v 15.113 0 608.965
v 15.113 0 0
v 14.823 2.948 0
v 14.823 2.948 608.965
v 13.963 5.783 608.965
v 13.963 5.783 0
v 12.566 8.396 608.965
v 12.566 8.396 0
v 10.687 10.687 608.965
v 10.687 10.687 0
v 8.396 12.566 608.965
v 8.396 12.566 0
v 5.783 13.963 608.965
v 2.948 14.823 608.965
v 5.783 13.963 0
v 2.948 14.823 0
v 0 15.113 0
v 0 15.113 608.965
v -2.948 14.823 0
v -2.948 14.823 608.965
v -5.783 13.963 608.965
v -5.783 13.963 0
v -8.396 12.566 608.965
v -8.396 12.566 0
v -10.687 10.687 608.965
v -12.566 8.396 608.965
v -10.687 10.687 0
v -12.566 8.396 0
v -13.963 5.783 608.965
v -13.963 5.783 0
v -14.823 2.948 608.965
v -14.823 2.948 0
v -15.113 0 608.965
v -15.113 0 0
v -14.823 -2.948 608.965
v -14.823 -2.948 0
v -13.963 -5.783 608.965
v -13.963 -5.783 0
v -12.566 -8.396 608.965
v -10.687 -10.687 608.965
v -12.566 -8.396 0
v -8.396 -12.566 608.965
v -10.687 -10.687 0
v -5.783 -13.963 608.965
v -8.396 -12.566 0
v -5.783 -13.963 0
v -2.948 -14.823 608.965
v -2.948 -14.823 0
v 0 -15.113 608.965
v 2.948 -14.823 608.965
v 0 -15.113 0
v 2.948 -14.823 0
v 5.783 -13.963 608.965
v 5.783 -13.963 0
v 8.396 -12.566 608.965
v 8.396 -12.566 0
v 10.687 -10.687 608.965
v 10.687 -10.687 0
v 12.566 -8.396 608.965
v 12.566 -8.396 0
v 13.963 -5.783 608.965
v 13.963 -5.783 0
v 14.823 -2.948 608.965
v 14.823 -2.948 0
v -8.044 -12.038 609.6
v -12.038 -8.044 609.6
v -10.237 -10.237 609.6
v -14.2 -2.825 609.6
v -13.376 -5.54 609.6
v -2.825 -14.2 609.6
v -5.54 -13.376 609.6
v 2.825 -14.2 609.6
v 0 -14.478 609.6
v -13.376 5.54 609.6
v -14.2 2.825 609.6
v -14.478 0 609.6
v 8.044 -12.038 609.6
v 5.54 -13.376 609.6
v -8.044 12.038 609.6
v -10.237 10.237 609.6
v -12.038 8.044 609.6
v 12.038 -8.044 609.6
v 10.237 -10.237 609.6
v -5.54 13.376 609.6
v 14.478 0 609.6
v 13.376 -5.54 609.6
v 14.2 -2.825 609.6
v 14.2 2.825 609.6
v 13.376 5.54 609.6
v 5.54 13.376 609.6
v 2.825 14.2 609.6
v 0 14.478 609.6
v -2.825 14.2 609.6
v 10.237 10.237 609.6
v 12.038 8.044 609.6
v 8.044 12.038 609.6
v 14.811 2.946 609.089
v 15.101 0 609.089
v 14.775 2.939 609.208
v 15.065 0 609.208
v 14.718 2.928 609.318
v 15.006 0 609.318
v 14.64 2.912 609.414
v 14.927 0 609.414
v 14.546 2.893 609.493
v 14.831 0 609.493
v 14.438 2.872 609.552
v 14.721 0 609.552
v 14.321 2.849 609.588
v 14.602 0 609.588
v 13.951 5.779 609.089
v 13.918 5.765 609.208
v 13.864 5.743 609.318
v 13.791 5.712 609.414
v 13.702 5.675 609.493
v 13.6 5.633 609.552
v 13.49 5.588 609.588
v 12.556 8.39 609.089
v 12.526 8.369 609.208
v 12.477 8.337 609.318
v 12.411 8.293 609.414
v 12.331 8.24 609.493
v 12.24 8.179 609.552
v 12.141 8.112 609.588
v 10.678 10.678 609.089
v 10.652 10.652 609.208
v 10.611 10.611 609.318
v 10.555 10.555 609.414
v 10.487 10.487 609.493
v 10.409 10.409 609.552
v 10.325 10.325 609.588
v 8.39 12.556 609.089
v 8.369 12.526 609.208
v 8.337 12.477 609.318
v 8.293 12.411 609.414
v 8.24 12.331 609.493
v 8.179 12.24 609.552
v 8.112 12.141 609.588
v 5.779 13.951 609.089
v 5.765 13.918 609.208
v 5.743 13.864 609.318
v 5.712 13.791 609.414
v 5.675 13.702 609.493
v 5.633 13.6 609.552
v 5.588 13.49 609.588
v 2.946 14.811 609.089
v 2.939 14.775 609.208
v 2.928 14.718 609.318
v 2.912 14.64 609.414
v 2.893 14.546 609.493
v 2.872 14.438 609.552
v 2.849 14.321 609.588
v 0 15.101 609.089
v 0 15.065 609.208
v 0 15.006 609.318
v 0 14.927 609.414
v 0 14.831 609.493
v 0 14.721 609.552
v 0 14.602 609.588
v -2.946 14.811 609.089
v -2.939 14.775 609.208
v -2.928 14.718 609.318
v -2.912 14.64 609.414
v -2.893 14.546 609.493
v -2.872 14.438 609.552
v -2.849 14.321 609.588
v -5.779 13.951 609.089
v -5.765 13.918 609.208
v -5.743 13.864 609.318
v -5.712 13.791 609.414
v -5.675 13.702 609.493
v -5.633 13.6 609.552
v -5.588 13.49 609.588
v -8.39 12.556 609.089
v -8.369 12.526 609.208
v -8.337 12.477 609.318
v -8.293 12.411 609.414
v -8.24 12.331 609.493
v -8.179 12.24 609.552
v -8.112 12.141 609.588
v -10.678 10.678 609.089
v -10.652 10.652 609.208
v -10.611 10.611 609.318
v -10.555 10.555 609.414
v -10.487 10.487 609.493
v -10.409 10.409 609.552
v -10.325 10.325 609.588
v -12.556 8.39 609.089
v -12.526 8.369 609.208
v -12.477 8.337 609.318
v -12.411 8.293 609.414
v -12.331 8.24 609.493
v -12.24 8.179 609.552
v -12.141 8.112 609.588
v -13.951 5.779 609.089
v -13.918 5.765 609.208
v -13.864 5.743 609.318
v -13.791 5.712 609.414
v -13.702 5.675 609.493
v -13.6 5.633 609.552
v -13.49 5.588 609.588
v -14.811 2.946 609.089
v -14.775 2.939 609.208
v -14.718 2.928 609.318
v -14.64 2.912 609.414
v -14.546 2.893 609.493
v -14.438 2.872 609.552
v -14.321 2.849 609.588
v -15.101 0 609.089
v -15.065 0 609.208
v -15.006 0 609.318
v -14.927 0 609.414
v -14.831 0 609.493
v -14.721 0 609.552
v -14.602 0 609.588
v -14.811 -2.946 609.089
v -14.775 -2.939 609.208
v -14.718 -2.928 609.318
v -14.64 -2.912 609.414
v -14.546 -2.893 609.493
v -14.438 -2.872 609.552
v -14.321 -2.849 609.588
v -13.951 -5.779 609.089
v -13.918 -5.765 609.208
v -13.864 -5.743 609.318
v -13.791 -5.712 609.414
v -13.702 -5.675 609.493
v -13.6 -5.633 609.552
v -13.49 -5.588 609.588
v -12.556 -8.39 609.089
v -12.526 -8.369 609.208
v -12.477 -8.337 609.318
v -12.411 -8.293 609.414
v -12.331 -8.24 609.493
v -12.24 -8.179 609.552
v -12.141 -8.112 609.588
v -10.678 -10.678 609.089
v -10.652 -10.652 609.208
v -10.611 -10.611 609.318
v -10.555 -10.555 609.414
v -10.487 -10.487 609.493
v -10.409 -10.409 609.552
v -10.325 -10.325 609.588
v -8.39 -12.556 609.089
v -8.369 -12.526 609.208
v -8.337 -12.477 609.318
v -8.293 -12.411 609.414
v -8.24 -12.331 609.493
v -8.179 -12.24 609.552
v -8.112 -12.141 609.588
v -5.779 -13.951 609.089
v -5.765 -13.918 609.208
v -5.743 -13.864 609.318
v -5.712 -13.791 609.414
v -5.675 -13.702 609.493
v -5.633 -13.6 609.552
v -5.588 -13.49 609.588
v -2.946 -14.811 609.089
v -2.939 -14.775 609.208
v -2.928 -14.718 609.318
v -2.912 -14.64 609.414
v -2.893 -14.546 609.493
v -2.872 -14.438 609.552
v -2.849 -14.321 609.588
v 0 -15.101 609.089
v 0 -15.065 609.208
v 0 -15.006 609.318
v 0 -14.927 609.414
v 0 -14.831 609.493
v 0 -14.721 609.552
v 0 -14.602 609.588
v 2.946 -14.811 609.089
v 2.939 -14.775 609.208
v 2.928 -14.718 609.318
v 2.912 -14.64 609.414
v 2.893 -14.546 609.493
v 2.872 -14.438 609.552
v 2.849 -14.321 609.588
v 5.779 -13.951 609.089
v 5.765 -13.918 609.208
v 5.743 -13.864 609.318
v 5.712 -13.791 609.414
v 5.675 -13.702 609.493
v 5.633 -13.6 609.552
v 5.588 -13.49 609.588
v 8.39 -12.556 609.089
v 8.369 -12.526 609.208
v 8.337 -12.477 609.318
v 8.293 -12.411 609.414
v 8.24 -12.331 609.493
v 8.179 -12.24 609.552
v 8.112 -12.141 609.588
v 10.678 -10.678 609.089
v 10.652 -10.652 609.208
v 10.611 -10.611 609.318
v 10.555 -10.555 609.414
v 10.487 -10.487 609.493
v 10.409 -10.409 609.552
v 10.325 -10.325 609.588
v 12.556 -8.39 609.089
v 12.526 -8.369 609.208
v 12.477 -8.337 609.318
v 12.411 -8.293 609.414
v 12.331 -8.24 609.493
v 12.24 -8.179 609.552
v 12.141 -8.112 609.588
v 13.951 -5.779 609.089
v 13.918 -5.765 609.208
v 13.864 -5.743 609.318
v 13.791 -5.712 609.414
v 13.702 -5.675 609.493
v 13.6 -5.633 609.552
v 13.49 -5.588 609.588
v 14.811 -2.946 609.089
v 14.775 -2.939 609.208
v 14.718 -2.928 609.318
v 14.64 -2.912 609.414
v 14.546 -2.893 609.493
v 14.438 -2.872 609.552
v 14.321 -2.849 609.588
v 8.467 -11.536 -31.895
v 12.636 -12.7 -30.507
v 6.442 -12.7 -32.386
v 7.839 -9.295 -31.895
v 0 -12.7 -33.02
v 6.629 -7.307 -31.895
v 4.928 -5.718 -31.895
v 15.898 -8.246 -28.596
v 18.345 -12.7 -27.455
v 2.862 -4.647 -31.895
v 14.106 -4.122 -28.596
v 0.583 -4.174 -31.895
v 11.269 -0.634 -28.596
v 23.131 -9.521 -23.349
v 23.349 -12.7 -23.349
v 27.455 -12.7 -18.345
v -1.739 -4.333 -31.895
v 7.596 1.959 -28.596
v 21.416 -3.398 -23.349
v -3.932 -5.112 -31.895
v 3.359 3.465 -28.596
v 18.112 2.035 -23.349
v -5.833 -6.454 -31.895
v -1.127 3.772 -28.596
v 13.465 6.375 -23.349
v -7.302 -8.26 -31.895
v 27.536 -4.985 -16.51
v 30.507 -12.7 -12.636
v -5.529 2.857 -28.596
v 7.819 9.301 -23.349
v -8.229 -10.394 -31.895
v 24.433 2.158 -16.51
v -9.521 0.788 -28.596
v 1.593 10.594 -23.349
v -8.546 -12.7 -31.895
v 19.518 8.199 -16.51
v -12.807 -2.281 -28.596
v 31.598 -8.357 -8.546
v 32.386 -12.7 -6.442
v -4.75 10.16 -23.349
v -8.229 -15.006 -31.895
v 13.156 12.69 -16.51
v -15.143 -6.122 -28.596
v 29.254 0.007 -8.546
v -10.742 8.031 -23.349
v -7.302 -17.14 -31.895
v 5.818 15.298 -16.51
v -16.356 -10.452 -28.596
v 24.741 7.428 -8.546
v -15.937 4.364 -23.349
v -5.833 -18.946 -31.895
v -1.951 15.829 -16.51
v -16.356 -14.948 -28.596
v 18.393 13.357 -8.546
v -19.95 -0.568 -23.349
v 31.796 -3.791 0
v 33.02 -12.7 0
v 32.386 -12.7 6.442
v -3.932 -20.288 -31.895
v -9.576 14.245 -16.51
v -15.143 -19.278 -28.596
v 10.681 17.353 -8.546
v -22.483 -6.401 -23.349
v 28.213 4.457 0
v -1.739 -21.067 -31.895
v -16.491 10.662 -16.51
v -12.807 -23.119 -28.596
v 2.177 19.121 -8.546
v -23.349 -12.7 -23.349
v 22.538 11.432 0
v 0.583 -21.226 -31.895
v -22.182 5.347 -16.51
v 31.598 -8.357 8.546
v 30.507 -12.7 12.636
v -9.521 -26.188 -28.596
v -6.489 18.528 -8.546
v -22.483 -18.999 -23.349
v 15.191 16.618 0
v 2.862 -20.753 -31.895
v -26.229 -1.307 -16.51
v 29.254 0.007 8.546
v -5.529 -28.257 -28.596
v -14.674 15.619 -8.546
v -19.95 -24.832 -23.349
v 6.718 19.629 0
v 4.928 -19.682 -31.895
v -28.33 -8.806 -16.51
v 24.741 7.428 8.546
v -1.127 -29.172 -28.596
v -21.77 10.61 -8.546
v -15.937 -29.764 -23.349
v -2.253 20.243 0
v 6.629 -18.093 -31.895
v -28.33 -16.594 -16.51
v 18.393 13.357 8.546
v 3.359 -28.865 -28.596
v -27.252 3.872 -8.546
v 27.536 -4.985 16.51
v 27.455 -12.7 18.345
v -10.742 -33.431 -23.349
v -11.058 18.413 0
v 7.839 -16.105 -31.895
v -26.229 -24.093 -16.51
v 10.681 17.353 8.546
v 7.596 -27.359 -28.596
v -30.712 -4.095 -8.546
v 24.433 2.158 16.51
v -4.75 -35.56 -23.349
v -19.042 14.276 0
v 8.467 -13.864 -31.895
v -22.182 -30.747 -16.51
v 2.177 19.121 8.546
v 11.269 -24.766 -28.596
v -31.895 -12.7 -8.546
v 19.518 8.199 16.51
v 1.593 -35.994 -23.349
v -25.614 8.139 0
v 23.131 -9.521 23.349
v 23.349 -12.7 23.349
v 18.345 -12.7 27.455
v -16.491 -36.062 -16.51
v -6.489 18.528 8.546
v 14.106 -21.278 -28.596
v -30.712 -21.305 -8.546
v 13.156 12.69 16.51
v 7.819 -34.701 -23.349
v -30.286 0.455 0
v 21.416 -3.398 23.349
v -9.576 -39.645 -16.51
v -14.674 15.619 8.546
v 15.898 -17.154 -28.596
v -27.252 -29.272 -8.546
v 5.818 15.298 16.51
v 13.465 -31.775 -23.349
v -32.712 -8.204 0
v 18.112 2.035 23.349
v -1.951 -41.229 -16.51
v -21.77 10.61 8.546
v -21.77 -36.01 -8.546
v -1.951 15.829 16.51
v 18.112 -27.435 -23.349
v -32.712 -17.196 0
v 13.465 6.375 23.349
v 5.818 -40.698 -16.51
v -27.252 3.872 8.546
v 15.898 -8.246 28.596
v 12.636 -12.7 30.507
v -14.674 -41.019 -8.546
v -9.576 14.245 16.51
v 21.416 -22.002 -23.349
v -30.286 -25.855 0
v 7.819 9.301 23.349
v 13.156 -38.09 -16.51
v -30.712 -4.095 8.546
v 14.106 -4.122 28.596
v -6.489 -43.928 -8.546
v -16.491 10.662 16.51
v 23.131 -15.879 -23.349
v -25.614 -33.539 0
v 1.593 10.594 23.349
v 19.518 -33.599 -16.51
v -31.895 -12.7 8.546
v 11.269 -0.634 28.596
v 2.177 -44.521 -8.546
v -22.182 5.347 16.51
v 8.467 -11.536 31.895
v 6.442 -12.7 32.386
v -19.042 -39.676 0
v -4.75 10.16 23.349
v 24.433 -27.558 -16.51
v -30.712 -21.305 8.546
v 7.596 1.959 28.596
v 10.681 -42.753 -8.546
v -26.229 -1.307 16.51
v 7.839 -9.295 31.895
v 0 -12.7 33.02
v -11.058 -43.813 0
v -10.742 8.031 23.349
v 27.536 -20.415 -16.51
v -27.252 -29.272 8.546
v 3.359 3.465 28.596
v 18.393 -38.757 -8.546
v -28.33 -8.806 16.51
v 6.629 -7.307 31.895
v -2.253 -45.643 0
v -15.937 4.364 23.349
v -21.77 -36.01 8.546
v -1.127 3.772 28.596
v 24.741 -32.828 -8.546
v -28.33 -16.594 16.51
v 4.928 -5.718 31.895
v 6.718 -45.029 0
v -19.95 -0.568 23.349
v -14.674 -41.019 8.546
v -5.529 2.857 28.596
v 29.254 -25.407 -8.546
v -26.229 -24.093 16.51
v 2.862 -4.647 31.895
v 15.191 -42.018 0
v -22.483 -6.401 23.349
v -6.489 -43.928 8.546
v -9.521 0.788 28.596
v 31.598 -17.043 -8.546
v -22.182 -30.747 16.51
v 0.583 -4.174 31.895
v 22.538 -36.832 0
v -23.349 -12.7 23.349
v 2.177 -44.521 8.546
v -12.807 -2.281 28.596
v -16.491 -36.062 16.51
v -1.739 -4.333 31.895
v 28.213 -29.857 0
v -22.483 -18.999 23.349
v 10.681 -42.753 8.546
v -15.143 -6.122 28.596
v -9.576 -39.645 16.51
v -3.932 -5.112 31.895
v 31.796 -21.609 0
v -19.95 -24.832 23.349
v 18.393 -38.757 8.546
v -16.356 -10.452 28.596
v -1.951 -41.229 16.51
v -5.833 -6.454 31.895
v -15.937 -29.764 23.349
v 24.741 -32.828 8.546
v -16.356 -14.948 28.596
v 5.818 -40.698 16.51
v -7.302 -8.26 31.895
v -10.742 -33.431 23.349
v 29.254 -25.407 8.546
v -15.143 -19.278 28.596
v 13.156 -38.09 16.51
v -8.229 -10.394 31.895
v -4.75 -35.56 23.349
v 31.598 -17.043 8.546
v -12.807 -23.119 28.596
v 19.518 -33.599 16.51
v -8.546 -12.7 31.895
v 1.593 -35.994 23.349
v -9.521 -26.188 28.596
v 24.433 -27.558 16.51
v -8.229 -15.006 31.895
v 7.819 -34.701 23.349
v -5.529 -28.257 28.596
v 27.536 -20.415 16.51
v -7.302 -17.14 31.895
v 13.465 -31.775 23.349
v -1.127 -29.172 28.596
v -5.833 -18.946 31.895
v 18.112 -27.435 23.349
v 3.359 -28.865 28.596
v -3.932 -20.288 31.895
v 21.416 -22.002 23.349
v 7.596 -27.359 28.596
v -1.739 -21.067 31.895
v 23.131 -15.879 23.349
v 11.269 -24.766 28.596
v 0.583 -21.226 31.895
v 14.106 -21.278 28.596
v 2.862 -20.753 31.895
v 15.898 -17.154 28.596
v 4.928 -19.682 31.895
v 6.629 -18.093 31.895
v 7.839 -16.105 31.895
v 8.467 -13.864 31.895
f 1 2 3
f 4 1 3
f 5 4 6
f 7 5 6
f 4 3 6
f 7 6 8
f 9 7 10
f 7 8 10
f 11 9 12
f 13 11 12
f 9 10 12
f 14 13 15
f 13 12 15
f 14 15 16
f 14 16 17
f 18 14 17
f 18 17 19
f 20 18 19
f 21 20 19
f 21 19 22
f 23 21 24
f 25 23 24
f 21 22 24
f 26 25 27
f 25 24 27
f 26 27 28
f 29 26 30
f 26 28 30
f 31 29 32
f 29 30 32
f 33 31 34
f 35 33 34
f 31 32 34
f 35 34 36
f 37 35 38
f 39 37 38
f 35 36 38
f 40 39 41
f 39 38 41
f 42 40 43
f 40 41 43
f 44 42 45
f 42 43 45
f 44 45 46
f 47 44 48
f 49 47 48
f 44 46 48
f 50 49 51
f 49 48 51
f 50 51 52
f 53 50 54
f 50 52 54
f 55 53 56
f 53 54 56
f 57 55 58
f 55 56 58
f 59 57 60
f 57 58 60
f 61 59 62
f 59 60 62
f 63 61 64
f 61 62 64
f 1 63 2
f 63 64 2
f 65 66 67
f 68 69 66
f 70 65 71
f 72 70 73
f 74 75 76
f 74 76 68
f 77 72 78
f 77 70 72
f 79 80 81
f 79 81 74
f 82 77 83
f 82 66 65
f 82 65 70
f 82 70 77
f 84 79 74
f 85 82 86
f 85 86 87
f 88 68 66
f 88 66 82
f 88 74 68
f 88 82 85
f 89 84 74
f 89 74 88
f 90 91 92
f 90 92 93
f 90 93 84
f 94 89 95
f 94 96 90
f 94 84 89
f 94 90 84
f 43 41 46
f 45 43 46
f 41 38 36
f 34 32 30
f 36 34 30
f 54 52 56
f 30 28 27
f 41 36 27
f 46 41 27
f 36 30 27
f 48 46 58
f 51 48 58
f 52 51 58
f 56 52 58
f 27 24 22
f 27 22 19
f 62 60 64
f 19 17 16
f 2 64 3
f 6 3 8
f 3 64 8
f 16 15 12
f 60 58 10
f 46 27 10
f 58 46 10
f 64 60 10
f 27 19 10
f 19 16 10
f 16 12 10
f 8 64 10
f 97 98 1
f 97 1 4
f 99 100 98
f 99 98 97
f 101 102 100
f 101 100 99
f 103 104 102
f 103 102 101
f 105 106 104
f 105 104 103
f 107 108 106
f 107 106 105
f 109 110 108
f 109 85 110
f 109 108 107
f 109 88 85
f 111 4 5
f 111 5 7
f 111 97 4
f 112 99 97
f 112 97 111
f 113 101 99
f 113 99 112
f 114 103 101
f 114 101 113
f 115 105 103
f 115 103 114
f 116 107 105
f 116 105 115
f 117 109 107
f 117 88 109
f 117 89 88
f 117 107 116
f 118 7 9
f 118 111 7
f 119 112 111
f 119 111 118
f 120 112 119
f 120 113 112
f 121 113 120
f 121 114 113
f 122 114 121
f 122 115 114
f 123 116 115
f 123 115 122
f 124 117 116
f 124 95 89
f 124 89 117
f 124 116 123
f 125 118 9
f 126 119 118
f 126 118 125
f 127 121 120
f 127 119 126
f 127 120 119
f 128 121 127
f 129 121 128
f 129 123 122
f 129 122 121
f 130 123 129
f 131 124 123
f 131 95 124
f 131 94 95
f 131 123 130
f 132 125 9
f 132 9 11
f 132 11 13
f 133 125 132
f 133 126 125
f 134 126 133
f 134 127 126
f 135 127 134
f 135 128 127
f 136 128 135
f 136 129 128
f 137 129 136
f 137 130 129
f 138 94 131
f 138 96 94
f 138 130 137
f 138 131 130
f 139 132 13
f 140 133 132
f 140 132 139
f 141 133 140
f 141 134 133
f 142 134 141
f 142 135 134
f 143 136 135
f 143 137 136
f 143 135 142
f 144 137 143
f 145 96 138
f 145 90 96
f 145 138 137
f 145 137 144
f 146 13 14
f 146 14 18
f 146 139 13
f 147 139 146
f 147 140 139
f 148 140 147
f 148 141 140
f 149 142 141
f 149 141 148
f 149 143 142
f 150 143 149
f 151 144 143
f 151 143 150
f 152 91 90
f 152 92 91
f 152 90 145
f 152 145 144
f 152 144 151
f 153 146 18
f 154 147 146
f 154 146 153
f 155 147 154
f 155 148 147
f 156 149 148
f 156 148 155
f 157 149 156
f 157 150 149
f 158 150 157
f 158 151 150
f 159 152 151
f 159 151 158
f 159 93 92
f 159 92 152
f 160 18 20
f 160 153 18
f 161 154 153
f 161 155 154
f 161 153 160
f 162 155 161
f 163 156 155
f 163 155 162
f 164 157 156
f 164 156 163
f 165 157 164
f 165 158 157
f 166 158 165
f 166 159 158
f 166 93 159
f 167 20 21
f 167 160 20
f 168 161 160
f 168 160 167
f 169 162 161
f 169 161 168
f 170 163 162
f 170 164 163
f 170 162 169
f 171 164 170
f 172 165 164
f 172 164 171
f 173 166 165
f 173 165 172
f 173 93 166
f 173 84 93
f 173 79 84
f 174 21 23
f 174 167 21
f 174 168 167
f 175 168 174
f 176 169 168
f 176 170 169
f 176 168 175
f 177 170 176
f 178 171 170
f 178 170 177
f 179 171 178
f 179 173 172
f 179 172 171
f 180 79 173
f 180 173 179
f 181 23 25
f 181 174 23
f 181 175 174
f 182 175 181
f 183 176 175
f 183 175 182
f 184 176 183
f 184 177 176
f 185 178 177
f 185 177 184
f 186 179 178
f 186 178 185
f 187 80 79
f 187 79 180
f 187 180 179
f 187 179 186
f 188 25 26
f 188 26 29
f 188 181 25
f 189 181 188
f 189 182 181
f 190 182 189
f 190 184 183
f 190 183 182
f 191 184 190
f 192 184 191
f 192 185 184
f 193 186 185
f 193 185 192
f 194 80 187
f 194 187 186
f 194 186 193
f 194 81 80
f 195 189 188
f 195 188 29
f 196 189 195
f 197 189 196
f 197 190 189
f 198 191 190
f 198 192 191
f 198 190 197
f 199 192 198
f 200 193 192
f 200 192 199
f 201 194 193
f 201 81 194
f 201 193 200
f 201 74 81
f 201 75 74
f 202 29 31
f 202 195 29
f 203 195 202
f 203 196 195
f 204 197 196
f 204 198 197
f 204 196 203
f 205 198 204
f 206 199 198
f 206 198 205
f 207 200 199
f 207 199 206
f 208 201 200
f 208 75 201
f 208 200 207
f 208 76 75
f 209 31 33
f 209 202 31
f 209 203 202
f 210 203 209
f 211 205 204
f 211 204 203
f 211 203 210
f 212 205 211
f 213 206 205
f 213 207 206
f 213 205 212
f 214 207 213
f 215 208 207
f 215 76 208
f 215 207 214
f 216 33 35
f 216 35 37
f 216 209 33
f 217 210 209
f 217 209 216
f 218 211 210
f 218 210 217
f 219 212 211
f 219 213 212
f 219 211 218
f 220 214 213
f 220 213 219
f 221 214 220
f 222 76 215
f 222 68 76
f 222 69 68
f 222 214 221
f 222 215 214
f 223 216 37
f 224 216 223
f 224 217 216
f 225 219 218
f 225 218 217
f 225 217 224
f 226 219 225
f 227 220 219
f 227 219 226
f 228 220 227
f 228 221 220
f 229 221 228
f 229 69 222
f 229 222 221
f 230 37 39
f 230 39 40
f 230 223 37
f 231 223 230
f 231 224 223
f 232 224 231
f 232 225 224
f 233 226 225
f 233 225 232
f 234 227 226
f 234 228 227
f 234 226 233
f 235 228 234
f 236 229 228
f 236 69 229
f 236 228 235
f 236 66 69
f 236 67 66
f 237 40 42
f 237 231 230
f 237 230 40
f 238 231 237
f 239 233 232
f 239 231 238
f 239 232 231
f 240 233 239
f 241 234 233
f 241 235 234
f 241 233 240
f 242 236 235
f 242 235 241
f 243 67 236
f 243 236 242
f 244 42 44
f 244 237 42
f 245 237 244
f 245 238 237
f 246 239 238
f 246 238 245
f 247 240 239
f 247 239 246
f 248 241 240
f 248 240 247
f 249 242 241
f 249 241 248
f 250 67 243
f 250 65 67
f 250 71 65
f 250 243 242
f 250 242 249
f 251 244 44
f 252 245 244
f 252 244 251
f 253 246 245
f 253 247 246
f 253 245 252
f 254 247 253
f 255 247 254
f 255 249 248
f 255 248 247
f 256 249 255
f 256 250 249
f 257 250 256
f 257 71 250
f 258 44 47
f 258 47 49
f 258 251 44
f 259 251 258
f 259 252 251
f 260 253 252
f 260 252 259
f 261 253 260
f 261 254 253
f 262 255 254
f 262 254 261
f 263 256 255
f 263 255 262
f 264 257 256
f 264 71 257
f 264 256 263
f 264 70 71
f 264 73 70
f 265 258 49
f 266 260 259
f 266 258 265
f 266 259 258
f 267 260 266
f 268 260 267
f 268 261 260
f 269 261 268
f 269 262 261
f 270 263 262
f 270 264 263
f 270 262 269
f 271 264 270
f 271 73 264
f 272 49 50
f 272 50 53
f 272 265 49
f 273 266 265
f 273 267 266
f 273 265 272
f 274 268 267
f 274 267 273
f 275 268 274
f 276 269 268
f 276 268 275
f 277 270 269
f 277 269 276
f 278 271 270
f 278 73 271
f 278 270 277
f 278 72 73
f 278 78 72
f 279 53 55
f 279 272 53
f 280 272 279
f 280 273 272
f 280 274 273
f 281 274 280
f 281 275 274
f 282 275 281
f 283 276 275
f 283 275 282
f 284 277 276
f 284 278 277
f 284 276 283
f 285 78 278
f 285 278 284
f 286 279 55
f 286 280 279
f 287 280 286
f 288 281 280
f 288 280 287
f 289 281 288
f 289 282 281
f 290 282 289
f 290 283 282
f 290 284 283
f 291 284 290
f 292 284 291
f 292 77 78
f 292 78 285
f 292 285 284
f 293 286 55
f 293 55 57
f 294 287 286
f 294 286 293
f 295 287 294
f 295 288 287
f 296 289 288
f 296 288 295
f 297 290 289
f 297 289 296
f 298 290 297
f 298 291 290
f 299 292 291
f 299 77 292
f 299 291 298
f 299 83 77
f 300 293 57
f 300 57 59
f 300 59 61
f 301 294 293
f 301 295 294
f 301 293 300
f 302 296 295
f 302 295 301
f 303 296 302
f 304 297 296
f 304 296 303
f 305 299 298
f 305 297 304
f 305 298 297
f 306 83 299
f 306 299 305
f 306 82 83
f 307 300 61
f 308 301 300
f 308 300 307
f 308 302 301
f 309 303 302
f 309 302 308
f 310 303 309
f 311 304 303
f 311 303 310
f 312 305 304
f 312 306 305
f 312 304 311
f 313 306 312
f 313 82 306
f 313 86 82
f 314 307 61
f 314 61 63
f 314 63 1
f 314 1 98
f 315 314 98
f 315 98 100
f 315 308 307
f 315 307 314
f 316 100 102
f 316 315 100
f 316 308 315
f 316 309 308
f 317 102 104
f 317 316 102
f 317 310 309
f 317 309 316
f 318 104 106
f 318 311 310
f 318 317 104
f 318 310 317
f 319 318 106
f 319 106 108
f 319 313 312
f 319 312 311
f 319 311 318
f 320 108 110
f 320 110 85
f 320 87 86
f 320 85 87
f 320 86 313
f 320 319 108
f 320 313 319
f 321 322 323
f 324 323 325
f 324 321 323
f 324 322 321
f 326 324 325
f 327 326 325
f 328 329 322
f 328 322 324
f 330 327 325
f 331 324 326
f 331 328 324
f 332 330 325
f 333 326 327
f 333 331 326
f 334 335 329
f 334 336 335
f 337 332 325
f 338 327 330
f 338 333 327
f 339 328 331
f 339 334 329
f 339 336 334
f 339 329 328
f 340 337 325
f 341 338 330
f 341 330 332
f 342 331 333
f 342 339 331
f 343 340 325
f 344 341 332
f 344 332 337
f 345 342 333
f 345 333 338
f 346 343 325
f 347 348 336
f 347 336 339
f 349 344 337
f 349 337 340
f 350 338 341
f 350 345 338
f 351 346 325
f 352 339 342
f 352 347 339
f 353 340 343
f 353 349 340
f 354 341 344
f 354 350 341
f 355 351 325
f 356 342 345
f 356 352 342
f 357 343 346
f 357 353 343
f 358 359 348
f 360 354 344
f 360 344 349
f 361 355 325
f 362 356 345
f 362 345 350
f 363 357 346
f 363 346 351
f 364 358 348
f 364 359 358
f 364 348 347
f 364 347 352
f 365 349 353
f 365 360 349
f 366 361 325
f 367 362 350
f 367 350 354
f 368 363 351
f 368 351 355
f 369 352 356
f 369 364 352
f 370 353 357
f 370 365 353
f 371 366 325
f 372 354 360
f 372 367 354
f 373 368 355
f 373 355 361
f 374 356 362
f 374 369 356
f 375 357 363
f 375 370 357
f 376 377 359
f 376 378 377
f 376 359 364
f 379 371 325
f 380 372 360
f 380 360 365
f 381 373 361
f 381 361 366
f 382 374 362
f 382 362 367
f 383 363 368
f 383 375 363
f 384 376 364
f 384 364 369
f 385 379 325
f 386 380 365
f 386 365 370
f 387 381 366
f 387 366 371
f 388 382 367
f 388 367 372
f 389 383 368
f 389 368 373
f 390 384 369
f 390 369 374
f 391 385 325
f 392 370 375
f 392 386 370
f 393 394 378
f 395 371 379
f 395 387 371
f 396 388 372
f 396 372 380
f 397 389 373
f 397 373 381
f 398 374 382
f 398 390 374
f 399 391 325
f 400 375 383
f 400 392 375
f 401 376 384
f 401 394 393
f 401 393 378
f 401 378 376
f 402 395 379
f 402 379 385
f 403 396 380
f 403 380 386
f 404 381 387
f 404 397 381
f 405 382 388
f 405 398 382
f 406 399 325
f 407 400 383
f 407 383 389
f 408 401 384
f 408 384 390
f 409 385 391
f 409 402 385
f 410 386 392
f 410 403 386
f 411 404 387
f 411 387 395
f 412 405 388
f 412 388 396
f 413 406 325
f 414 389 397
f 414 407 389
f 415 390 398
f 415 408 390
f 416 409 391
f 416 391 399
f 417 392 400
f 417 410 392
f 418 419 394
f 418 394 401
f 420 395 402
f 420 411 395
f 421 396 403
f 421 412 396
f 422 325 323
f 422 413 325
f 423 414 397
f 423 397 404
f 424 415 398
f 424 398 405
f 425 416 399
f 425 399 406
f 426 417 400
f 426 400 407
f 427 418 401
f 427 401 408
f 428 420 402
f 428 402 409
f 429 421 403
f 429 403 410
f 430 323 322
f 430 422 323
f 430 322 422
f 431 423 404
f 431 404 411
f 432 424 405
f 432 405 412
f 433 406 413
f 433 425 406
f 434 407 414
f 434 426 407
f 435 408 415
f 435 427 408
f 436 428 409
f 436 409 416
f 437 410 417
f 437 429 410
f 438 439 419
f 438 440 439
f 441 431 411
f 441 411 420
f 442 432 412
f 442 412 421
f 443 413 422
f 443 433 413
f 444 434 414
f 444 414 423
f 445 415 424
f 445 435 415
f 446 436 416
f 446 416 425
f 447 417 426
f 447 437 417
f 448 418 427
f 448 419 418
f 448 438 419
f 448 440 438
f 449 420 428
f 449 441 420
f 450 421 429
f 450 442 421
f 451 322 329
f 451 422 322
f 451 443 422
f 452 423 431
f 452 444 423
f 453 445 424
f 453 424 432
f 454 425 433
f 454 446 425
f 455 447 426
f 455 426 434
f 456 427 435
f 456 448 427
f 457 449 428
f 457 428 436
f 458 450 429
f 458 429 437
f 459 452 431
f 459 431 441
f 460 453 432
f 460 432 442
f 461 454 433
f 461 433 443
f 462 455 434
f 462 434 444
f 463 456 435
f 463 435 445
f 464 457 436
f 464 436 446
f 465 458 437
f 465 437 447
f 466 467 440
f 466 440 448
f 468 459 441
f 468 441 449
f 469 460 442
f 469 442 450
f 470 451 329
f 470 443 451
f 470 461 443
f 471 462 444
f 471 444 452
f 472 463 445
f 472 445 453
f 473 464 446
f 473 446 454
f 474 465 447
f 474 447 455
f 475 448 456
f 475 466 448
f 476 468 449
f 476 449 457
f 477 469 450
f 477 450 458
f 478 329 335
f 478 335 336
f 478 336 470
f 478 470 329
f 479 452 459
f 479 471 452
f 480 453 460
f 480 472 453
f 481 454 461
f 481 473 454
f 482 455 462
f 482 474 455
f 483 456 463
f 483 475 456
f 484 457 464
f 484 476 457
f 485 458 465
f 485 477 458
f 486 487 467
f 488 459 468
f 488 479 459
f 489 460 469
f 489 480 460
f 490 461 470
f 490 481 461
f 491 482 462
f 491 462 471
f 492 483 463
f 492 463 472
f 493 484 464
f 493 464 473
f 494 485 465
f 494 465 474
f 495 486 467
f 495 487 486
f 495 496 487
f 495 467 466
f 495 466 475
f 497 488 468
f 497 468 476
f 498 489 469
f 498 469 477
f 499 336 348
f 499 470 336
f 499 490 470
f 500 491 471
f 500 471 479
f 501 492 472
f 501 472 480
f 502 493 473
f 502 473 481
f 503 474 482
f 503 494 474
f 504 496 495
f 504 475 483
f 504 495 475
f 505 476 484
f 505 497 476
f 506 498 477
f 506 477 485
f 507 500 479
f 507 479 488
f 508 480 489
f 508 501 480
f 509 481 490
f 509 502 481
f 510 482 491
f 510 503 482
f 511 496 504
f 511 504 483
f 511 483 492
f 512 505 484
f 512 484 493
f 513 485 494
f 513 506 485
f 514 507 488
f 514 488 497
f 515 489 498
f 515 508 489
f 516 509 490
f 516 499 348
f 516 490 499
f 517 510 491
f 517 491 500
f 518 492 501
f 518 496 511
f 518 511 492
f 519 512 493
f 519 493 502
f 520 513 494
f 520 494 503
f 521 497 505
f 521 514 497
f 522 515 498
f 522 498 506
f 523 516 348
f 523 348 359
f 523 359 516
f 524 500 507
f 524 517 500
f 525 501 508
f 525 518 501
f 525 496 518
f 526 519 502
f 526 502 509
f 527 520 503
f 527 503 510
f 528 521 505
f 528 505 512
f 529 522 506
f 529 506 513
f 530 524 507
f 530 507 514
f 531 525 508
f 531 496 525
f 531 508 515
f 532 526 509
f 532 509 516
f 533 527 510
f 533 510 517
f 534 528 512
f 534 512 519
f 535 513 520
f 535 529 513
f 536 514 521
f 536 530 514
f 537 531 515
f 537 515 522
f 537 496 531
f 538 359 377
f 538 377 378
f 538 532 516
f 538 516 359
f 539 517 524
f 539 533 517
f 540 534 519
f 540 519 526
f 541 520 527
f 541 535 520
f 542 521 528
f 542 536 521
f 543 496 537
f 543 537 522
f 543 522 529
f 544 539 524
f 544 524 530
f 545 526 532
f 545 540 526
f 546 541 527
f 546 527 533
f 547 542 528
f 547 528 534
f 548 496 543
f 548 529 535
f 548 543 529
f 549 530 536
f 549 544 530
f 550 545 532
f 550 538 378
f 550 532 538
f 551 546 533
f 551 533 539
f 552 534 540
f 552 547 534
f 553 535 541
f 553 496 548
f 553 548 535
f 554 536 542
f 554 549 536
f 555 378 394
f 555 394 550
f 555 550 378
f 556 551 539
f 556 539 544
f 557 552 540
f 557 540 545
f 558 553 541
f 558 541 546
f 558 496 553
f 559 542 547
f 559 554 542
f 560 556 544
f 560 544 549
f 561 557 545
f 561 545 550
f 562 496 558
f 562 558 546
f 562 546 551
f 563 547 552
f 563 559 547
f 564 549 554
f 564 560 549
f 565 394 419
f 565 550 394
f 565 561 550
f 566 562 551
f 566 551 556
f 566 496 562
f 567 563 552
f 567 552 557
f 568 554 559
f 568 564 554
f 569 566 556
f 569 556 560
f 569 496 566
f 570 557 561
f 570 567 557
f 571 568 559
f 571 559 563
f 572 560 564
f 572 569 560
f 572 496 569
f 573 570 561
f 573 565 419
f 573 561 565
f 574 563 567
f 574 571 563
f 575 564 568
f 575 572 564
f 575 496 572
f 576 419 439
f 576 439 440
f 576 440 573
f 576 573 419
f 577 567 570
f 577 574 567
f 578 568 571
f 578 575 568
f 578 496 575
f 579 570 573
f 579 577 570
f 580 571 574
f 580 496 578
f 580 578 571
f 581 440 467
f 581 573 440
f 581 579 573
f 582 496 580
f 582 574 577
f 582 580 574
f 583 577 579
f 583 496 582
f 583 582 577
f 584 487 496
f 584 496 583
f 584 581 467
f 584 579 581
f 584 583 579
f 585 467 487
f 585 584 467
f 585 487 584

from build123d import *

# Parameters (mm, degrees)
F0_R     = 15.113
F1_DEPTH = 609.6
F2_R     = 0.635


# Not quite as in the source:
# - the program builds the solid bodies; features that only make, move or delete a surface that nothing else refers to are left out


with BuildPart() as f1:
    # F0 (on Top) → F1 (new body)
    with BuildSketch(Plane.XY):
        Circle(F0_R)
    extrude(amount=F1_DEPTH)

    # F2
    f2_edges = [f1.edges().sort_by_distance(p)[0] for p in [
        (-15.113, 0, 609.6),
    ]]
    fillet(f2_edges, radius=F2_R)


with BuildPart() as f7:
    # F6 (on offset) → F7 (revolve)
    with BuildSketch(Plane.XZ.offset(12.7)):
        with BuildLine():
            Line((0, 33.02), (0, -33.02))
            ThreePointArc((0, -33.02), (33.02, 0), (0, 33.02))
        make_face()
    revolve(axis=Axis((0, -12.7, 0), (0, 0, 1)))


solid = Compound([f1.part, f7.part])
